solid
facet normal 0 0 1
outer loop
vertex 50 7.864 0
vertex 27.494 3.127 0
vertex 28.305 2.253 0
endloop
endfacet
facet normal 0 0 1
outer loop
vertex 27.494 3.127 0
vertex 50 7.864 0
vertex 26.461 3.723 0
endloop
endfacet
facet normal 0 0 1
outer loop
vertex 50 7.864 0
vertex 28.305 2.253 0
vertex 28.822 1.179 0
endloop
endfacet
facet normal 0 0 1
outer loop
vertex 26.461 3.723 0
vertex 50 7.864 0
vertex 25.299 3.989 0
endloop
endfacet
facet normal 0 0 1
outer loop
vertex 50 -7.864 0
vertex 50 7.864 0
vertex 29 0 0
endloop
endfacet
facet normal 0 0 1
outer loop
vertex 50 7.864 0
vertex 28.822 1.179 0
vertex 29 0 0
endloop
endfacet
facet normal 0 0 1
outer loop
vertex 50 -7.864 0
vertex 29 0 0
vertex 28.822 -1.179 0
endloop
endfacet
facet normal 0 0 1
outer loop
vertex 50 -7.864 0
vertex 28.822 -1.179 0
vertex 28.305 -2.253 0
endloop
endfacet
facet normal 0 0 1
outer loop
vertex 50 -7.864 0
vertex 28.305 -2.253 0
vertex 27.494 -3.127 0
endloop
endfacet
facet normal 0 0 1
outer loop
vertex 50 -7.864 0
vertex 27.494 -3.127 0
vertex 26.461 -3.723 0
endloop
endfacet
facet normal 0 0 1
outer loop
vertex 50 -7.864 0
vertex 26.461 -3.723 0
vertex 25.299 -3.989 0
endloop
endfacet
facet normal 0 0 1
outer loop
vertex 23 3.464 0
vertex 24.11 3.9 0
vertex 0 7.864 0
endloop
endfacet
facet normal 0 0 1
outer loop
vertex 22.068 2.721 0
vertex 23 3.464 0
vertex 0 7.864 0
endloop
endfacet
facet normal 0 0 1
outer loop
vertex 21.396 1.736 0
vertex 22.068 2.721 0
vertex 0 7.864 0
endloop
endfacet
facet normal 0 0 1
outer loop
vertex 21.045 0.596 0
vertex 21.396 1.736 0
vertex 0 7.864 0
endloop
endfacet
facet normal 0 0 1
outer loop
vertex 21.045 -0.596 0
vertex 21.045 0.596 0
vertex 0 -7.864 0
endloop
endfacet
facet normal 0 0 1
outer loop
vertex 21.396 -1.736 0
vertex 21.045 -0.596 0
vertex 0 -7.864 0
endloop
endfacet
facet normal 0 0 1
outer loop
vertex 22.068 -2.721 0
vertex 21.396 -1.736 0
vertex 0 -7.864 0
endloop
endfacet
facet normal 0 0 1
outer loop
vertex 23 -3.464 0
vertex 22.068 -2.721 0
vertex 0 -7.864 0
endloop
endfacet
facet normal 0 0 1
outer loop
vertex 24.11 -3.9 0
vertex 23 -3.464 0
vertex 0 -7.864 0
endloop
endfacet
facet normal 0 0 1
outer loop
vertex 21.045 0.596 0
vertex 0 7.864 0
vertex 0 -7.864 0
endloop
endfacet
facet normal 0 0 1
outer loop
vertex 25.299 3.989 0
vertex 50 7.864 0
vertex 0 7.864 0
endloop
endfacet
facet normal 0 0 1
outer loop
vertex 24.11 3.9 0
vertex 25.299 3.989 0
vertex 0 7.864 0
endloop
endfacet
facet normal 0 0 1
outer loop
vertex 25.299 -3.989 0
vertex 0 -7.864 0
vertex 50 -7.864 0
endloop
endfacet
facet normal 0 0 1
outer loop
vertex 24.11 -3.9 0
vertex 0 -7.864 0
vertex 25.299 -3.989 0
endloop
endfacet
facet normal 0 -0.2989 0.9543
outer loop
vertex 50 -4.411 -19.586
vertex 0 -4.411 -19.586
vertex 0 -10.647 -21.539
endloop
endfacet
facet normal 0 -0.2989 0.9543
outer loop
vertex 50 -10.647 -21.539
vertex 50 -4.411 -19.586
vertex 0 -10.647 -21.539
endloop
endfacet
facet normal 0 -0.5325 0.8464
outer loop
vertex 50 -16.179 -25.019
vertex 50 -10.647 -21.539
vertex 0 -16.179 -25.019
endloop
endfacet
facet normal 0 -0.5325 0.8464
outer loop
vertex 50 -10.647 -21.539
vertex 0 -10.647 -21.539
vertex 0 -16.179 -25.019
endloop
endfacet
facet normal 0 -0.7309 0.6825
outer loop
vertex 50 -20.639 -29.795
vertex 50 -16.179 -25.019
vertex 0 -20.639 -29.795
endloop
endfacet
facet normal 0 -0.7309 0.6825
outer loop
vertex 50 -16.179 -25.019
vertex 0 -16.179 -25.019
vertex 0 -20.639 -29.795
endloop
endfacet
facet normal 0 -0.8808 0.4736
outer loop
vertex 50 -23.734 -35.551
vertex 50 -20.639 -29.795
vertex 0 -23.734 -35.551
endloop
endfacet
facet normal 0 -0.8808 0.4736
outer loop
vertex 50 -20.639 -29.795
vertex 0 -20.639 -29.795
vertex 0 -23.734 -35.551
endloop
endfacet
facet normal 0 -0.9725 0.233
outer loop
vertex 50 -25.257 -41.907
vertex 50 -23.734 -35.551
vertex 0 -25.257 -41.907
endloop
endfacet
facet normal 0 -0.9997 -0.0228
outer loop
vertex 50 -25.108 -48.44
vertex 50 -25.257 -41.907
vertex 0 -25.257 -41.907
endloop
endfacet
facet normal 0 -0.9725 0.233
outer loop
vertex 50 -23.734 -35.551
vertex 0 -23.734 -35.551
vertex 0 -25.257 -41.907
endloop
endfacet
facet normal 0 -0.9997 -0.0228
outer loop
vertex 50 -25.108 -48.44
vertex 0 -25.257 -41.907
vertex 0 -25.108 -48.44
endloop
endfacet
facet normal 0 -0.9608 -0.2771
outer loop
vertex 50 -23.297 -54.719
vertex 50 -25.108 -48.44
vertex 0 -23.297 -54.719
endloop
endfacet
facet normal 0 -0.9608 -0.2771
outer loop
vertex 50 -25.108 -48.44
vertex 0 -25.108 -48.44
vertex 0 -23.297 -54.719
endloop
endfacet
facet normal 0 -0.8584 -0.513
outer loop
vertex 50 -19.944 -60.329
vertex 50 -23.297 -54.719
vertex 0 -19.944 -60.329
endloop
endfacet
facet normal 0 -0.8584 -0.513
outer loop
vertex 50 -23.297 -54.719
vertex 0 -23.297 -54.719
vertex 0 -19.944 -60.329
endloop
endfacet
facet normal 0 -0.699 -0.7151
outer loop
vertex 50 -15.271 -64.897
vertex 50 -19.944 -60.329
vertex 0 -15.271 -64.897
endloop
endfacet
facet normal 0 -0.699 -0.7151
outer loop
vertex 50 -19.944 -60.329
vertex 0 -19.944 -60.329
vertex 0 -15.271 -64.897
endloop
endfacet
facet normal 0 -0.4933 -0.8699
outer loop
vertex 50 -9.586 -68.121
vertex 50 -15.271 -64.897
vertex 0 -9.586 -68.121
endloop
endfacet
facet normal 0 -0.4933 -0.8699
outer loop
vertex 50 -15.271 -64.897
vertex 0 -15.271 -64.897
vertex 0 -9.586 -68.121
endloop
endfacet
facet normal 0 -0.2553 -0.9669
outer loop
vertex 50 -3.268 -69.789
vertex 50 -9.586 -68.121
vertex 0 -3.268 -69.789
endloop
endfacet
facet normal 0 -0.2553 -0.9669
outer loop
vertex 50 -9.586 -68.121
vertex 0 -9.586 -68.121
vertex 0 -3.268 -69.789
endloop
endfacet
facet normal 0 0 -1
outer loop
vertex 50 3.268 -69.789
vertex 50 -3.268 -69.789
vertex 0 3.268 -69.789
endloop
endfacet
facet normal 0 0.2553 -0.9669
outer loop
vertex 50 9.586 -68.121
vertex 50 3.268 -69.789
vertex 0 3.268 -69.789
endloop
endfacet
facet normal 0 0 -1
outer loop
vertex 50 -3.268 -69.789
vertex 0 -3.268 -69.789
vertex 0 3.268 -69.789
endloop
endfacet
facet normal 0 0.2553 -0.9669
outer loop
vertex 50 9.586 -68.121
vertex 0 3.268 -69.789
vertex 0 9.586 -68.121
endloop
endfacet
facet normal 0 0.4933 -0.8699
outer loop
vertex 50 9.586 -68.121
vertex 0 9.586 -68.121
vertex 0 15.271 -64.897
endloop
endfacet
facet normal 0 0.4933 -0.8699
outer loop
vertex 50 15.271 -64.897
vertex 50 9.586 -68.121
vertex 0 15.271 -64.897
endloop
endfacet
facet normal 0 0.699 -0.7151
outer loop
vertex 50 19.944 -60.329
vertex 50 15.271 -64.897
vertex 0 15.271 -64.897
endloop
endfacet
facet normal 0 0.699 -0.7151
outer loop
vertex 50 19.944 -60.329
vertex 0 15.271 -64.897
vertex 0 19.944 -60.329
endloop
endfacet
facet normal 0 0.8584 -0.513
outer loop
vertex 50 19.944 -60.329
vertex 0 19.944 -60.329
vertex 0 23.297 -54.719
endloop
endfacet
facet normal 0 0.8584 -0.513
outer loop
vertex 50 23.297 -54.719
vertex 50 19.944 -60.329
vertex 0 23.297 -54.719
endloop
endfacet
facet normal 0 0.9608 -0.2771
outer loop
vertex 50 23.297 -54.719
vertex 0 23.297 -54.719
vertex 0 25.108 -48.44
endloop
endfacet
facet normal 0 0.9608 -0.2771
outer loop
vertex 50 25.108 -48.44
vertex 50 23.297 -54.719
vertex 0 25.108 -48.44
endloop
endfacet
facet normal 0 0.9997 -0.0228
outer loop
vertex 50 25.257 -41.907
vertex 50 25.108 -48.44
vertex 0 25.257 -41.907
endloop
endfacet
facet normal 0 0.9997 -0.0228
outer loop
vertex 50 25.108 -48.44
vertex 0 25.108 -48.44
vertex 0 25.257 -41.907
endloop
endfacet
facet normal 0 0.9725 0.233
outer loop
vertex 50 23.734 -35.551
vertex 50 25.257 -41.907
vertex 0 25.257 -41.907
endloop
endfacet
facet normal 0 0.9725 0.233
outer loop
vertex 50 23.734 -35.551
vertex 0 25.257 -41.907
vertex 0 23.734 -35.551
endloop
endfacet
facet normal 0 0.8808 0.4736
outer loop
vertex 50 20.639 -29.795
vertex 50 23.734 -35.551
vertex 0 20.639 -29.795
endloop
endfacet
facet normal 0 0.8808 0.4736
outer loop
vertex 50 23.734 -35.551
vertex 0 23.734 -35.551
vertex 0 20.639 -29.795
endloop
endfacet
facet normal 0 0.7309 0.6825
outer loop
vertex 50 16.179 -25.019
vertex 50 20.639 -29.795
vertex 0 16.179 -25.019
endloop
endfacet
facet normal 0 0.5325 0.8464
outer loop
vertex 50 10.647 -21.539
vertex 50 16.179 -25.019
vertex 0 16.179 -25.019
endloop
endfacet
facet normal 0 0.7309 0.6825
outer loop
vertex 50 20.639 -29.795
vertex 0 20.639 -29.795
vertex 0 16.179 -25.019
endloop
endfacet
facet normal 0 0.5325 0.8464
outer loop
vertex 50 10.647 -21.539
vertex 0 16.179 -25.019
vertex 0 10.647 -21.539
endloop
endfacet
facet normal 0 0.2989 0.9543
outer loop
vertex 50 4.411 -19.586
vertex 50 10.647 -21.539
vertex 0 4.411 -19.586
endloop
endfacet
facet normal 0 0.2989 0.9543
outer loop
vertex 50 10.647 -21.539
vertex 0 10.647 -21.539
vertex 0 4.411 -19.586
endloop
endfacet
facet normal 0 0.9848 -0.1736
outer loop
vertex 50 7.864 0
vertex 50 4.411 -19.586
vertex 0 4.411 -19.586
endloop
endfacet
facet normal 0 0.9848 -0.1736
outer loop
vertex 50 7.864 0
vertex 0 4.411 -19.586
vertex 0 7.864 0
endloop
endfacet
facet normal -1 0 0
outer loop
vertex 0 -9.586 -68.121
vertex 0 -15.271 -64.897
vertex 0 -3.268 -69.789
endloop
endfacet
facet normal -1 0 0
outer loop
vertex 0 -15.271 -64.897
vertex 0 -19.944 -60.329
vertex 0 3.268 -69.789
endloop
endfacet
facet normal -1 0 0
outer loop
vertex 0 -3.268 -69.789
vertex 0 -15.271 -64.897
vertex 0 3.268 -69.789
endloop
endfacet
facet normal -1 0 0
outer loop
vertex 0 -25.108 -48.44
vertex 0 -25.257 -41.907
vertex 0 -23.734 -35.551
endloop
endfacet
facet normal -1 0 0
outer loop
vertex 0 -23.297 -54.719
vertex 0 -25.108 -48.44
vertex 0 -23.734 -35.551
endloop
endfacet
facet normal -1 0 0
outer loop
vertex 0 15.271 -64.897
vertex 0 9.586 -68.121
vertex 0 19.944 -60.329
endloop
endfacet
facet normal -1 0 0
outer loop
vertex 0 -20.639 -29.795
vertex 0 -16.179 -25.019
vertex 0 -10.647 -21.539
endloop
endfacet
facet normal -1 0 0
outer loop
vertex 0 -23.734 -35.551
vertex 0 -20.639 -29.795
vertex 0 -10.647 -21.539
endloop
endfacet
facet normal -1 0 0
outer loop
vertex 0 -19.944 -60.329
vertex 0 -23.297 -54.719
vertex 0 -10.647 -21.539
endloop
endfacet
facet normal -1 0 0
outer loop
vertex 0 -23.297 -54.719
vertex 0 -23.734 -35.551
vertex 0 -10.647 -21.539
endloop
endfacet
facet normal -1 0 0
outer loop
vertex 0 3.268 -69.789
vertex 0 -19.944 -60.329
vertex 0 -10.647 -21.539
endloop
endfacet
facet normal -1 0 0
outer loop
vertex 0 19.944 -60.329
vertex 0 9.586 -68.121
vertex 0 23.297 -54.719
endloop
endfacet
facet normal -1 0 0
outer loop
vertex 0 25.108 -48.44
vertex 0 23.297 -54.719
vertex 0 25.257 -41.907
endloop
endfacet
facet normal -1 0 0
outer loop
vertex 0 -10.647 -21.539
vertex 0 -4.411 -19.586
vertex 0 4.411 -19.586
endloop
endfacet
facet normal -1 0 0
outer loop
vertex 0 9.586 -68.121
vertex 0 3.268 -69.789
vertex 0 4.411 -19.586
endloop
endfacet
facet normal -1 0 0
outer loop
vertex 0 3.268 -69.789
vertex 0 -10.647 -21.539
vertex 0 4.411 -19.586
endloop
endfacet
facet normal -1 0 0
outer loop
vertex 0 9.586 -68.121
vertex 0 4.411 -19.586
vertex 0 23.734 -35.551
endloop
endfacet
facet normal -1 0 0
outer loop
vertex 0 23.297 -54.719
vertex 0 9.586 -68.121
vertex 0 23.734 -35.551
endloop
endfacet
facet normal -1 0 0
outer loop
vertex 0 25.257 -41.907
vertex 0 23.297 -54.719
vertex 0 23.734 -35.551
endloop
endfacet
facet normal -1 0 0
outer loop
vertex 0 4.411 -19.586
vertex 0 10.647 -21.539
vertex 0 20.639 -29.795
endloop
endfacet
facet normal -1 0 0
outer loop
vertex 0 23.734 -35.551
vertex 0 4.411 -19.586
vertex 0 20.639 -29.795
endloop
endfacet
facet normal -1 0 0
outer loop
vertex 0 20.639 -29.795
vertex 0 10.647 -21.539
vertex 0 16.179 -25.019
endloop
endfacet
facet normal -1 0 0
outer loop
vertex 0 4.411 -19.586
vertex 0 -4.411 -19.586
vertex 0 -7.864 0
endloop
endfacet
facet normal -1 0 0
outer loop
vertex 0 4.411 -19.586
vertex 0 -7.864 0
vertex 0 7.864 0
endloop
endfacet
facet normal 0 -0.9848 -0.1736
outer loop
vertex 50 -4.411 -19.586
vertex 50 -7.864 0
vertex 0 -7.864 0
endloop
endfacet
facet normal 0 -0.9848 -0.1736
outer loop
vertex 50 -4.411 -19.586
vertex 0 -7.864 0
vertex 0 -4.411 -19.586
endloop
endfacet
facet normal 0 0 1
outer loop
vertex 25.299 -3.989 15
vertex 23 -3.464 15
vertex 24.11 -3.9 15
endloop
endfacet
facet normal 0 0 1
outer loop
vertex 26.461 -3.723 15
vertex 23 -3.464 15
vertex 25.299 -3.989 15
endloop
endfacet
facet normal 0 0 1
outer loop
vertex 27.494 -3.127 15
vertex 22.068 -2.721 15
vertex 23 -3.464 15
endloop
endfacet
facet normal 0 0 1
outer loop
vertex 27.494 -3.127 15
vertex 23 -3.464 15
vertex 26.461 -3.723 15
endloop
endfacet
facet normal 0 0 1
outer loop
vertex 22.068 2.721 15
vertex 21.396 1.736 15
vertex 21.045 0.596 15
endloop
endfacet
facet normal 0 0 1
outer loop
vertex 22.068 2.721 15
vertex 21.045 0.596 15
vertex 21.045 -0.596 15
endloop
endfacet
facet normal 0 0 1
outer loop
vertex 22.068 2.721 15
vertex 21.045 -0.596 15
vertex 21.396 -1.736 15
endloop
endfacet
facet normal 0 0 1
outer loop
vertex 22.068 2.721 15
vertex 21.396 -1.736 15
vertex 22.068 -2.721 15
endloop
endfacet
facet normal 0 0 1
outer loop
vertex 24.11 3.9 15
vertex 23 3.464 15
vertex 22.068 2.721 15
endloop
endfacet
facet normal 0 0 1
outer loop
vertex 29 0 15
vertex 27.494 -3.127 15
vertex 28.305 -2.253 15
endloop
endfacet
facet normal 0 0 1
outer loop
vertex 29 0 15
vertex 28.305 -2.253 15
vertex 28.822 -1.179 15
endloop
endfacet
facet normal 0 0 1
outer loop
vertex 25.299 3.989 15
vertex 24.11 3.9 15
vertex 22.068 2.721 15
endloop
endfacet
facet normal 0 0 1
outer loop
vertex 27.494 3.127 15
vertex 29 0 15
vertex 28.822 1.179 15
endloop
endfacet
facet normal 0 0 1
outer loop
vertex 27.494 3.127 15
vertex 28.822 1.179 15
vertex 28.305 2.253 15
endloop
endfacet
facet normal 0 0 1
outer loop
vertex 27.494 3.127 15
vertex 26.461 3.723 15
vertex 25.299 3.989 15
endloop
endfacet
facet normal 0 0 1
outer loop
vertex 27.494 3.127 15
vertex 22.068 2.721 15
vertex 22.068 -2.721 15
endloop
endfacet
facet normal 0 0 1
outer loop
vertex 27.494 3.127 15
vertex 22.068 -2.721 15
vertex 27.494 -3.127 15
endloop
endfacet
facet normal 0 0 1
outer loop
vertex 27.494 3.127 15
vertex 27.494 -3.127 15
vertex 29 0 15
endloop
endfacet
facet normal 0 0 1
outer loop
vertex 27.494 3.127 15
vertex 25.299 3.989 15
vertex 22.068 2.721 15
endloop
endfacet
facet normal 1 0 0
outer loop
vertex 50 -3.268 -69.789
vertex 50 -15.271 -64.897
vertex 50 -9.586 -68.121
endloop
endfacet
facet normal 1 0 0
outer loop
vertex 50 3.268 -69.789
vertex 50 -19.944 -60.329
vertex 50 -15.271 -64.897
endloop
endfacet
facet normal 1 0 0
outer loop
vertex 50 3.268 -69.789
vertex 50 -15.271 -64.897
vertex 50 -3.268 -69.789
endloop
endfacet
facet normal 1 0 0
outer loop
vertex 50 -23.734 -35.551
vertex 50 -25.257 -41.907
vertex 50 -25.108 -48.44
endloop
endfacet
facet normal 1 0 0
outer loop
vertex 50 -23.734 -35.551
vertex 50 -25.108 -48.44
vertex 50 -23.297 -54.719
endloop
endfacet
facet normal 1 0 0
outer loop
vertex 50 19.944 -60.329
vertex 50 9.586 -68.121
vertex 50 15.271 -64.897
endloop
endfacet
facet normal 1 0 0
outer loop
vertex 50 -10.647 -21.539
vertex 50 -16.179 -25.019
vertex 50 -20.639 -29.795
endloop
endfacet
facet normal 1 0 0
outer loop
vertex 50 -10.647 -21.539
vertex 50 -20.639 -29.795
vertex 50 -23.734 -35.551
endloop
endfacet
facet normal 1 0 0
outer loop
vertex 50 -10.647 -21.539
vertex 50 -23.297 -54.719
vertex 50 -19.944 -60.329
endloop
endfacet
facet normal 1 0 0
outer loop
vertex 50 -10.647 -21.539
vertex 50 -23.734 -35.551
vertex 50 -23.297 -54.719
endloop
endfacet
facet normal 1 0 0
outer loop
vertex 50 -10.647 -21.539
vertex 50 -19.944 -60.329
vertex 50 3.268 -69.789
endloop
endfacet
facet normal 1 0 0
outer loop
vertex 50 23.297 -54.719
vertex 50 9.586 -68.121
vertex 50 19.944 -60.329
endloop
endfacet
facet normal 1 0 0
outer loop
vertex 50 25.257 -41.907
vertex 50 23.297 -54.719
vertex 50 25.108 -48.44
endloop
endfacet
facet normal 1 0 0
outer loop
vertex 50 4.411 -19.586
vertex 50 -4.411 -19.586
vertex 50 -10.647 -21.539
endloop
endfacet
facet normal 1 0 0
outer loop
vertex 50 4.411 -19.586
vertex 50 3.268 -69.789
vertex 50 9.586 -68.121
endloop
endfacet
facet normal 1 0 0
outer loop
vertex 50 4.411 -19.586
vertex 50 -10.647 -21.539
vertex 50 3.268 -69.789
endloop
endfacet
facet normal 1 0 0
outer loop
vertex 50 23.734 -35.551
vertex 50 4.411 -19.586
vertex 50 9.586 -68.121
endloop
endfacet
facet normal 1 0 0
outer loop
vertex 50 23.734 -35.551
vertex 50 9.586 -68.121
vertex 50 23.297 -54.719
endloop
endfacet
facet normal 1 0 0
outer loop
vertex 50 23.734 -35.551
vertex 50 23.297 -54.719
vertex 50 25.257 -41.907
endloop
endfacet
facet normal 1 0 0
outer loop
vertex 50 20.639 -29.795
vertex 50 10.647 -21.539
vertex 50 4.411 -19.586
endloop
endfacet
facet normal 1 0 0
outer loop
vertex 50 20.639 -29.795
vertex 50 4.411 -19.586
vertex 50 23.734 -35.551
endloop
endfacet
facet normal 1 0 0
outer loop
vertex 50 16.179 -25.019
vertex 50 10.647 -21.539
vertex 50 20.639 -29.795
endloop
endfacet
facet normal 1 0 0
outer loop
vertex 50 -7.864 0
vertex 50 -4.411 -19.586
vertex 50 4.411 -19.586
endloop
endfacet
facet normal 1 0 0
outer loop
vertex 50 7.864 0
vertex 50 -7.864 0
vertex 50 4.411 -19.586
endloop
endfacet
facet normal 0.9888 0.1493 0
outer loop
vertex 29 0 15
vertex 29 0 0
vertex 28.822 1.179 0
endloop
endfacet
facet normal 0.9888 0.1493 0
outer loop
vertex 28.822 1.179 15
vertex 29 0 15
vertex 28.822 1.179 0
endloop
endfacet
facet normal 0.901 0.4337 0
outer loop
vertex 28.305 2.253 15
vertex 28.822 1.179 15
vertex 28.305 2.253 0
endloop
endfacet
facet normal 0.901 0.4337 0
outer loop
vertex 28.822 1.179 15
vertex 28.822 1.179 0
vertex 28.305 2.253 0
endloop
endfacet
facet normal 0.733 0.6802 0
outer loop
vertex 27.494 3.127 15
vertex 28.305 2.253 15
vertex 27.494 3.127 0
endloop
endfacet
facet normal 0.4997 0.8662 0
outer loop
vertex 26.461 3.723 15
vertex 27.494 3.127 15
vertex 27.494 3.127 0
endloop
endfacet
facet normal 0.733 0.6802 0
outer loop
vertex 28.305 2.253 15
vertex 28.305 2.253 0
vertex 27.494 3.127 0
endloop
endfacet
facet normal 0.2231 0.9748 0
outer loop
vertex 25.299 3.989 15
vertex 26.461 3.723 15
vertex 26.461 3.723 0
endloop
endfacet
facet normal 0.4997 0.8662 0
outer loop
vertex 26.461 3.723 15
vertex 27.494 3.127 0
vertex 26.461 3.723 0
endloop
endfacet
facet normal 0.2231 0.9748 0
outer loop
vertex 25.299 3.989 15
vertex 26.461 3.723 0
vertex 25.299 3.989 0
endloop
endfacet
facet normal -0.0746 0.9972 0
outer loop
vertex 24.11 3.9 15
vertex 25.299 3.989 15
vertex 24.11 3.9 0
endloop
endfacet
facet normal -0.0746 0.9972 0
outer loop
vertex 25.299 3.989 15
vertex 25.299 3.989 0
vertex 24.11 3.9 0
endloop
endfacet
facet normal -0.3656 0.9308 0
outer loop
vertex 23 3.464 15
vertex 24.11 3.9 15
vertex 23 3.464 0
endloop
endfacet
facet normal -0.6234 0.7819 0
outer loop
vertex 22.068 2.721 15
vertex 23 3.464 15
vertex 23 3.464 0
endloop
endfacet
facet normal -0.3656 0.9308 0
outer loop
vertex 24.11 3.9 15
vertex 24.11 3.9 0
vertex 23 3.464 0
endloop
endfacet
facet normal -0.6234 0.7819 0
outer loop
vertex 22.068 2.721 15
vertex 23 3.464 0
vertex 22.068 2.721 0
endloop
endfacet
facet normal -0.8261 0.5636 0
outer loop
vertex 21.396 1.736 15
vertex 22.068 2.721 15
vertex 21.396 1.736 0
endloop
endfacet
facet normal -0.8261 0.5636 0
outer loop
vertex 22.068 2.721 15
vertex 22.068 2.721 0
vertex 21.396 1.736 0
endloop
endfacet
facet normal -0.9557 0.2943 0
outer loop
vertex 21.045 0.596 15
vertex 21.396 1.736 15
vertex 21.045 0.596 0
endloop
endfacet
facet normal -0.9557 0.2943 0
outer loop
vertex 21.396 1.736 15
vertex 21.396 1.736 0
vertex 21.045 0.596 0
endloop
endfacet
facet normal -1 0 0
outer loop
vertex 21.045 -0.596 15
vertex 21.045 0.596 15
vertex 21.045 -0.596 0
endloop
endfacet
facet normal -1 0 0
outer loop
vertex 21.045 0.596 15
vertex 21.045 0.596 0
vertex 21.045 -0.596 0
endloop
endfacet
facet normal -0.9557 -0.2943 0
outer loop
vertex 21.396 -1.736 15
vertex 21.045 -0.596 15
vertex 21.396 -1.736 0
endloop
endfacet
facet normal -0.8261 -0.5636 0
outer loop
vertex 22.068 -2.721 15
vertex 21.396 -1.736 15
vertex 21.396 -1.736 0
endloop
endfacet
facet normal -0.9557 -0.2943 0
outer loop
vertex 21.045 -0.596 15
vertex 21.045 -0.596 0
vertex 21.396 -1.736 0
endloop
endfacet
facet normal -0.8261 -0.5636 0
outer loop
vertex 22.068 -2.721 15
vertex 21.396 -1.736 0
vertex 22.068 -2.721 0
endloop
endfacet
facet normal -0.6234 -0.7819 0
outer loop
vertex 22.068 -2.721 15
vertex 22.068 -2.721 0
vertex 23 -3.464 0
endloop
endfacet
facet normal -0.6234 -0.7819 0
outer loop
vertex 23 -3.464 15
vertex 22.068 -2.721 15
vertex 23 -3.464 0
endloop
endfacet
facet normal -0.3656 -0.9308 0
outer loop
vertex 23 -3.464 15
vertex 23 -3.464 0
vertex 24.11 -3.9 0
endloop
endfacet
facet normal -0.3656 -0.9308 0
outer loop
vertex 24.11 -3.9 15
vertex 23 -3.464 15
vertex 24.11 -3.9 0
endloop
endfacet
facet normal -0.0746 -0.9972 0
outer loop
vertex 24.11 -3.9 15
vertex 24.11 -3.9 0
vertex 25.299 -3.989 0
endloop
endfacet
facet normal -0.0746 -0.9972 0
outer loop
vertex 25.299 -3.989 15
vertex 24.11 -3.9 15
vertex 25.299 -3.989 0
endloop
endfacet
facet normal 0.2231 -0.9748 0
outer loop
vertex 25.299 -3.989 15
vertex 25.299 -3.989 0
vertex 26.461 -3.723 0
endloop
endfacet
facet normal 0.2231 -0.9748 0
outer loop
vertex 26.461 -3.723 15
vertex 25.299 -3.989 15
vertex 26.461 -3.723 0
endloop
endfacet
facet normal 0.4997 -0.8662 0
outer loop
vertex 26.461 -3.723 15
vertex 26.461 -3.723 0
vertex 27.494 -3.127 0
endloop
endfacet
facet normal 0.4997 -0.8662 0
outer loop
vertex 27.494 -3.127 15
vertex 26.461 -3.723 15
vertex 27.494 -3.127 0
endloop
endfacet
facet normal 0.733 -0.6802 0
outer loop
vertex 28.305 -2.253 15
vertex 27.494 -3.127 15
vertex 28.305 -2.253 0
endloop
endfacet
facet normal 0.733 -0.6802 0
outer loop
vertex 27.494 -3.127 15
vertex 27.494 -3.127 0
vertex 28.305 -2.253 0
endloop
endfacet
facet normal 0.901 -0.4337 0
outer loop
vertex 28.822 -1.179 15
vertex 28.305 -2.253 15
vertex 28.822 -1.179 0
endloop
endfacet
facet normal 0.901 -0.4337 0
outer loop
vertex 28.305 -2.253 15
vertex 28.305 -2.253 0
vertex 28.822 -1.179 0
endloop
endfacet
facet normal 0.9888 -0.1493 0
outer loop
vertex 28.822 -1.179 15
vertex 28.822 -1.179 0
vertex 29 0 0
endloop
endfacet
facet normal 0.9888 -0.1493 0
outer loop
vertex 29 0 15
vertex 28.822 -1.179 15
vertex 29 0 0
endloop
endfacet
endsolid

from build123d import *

# Parameters (mm, degrees)
F1_DEPTH = 50
F2_R     = 4
F3_DEPTH = 15


with BuildPart() as f1:
    # F0 (on Right) → F1 (new body)
    with BuildSketch(Plane.YZ):
        with BuildLine():
            Line((-7.864183, 0), (-4.410664, -19.585883))
            ThreePointArc((-4.410664, -19.585883), (0, -70), (4.410664, -19.585883))
            Line((4.410664, -19.585883), (7.864183, 0))
            Line((7.864183, 0), (-7.864183, 0))
        make_face()
    extrude(amount=F1_DEPTH)

    # F2 (on face) → F3 (join)
    with BuildSketch(Plane.XY):
        with Locations((25, 0)):
            Circle(F2_R)
    extrude(amount=F3_DEPTH)


solid = f1.part
